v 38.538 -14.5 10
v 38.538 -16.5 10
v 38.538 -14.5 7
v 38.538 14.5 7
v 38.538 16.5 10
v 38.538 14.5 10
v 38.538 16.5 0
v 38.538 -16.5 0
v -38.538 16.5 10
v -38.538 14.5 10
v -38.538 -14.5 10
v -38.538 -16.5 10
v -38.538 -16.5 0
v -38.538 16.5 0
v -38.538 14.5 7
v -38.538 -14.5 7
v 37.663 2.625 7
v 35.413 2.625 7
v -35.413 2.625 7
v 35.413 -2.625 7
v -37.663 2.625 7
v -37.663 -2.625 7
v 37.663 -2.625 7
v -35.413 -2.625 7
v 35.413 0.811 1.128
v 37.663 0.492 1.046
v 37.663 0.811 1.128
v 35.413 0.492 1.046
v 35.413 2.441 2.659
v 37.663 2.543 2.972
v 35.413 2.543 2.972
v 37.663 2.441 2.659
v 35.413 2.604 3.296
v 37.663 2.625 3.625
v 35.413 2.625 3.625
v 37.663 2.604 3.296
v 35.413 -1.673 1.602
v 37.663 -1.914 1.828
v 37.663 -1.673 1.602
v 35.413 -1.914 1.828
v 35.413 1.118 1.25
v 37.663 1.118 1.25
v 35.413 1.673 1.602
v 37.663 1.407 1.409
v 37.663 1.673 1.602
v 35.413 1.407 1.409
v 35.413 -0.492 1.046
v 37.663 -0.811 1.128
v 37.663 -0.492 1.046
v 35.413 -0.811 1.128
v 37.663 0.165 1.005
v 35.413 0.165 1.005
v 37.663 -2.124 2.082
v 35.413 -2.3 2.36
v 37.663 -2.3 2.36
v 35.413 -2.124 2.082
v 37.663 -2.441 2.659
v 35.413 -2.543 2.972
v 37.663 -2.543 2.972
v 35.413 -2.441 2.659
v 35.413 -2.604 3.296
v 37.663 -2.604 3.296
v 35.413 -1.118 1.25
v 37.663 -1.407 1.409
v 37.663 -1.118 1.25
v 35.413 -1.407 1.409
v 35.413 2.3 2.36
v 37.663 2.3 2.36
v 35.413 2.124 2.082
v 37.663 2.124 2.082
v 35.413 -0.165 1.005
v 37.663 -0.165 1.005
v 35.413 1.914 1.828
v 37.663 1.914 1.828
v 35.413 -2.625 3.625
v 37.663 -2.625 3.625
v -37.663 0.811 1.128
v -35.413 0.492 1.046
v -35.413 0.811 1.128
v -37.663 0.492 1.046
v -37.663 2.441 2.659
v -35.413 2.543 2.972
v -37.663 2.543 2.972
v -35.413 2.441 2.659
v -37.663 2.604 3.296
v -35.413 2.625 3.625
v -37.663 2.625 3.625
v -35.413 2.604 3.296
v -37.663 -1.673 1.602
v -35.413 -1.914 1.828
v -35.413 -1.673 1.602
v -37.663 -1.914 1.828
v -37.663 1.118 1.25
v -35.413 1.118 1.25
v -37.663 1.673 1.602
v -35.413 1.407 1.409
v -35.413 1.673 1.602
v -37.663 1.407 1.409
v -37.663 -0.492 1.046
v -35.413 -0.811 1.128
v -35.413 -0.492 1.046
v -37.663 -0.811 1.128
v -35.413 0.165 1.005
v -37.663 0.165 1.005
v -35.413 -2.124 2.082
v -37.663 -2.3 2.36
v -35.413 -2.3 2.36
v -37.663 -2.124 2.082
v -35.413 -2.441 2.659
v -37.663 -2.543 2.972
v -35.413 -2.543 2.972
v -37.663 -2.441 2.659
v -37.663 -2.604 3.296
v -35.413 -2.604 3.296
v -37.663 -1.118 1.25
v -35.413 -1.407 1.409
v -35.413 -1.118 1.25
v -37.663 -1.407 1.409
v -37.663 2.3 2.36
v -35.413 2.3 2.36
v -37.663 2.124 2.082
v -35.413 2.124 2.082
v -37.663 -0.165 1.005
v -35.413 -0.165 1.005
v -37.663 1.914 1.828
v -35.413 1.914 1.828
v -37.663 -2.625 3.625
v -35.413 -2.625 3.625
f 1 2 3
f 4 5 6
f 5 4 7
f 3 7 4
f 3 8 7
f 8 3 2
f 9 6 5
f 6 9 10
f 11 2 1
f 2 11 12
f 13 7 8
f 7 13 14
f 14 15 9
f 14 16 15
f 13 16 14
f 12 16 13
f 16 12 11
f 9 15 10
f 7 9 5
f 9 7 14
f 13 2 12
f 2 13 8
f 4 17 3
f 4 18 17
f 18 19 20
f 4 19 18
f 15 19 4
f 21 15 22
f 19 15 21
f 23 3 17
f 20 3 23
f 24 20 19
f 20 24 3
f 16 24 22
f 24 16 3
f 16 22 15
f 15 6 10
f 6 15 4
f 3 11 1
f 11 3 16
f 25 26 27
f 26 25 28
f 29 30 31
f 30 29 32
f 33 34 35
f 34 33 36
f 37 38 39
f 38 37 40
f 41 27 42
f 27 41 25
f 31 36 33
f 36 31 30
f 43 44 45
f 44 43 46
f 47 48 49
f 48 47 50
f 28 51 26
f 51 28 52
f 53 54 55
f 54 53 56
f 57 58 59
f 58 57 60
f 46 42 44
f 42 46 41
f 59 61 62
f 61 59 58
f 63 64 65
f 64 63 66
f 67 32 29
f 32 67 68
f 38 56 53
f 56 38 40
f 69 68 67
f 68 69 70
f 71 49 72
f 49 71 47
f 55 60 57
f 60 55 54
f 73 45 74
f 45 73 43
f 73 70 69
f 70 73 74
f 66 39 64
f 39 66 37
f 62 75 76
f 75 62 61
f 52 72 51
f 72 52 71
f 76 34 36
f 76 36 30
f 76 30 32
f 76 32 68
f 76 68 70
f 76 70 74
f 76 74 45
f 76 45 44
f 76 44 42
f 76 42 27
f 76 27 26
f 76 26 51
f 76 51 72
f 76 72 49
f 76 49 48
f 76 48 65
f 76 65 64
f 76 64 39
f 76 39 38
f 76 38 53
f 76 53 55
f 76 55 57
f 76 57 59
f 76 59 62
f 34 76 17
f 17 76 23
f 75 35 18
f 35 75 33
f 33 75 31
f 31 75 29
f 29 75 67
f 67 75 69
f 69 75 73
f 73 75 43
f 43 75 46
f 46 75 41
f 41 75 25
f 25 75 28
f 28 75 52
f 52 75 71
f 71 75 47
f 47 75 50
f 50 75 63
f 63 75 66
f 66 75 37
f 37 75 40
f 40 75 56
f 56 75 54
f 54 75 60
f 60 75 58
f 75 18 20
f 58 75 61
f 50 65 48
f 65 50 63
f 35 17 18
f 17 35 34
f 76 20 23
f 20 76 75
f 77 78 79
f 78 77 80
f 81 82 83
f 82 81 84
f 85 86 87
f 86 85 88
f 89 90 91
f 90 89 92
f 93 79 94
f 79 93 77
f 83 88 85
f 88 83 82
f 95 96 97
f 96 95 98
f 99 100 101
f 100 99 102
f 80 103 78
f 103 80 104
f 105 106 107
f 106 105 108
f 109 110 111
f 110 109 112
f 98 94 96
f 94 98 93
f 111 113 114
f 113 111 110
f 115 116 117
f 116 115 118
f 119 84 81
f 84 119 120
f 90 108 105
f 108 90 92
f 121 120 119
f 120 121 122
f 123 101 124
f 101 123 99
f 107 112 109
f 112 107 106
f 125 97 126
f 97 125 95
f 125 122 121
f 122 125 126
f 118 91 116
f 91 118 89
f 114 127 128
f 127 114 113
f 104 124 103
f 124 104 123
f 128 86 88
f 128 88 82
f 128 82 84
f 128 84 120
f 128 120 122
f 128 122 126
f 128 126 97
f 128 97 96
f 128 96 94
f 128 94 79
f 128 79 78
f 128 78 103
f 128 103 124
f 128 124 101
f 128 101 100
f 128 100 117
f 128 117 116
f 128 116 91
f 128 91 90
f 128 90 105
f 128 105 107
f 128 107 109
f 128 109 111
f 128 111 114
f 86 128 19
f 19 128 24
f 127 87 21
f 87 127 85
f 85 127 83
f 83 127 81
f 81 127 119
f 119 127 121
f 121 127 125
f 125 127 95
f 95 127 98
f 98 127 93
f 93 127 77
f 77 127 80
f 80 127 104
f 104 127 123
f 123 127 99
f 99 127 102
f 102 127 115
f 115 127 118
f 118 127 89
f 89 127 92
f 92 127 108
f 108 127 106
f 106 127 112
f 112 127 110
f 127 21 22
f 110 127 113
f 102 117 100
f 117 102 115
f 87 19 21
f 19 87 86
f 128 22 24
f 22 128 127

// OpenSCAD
// file: modules.scad
 module regularPolygon(order = 4, r=1){
     angles=[ for (i = [0:order-1]) i*(360/order) ];
     coords=[ for (th=angles) [r*cos(th), r*sin(th)] ];
     polygon(coords);
 }

 module magHole() {
    
    magHoleThickness = magnetThickness + magnetMargin;
    magHoleDiameter = magnetDia+ magnetMargin;

    translate ([-magHoleThickness/2,0,0])
        rotate([0,0,90])
            translate ([0,0,magHoleDiameter/2 + 1])
                rotate([90,0,0])
    
                    union() {

                        cylinder(magHoleThickness, d = magHoleDiameter);

                        translate([-magHoleDiameter/2,0,0]) {
                            cube([magHoleDiameter, magHoleDiameter + baseHeight, magHoleThickness]);
                        }
                        
                    }

}
// file: shared-variables.scad
// all dimensions in millimeter
// height is used for all dimensions in Z dimension
$fn=50;

nozzelDiameter = 0.4;

tileDiameter = 89;
tileThickness = 2.5;

trayWallHeight = tileThickness * 2;

topSurfaceThickness = 1;

tileWidth = cos(30) * tileDiameter;


margin = 1;

thinWall = nozzelDiameter * 3;
mediumWall = nozzelDiameter * 5;
thickWall = nozzelDiameter * 7;

// this is the "floor"
baseHeight = 5;

hallBaseWidth = 33;
hallVoidWidth = hallBaseWidth - mediumWall * 2;


magnetDia = 5;
magnetThickness = 2;
magnetMargin = 0.25;
// main file
include <shared-variables.scad>;
include <modules.scad>;

module hallway(len = 50) {

translate([0,0,(baseHeight+ trayWallHeight)/2])
    difference() {
        cube([len,hallBaseWidth ,baseHeight+ trayWallHeight], center = true);
        translate([0,0,baseHeight])
            cube([len + 1,hallVoidWidth,trayWallHeight + 1], center = true);
    }

}

module magHoleTest() {
    
    difference() {
        
        hallway(5);
        translate ([-1,0,0])
            magHole();

    }

}

module simpleHallway() {

    difference () {
        
        hallway(tileWidth);

        xOffset = tileWidth / 2 - 2;

        translate([xOffset,0,0]) 
            magHole();

        translate([-xOffset,0,0]) 
            magHole();

    }

}

simpleHallway();
